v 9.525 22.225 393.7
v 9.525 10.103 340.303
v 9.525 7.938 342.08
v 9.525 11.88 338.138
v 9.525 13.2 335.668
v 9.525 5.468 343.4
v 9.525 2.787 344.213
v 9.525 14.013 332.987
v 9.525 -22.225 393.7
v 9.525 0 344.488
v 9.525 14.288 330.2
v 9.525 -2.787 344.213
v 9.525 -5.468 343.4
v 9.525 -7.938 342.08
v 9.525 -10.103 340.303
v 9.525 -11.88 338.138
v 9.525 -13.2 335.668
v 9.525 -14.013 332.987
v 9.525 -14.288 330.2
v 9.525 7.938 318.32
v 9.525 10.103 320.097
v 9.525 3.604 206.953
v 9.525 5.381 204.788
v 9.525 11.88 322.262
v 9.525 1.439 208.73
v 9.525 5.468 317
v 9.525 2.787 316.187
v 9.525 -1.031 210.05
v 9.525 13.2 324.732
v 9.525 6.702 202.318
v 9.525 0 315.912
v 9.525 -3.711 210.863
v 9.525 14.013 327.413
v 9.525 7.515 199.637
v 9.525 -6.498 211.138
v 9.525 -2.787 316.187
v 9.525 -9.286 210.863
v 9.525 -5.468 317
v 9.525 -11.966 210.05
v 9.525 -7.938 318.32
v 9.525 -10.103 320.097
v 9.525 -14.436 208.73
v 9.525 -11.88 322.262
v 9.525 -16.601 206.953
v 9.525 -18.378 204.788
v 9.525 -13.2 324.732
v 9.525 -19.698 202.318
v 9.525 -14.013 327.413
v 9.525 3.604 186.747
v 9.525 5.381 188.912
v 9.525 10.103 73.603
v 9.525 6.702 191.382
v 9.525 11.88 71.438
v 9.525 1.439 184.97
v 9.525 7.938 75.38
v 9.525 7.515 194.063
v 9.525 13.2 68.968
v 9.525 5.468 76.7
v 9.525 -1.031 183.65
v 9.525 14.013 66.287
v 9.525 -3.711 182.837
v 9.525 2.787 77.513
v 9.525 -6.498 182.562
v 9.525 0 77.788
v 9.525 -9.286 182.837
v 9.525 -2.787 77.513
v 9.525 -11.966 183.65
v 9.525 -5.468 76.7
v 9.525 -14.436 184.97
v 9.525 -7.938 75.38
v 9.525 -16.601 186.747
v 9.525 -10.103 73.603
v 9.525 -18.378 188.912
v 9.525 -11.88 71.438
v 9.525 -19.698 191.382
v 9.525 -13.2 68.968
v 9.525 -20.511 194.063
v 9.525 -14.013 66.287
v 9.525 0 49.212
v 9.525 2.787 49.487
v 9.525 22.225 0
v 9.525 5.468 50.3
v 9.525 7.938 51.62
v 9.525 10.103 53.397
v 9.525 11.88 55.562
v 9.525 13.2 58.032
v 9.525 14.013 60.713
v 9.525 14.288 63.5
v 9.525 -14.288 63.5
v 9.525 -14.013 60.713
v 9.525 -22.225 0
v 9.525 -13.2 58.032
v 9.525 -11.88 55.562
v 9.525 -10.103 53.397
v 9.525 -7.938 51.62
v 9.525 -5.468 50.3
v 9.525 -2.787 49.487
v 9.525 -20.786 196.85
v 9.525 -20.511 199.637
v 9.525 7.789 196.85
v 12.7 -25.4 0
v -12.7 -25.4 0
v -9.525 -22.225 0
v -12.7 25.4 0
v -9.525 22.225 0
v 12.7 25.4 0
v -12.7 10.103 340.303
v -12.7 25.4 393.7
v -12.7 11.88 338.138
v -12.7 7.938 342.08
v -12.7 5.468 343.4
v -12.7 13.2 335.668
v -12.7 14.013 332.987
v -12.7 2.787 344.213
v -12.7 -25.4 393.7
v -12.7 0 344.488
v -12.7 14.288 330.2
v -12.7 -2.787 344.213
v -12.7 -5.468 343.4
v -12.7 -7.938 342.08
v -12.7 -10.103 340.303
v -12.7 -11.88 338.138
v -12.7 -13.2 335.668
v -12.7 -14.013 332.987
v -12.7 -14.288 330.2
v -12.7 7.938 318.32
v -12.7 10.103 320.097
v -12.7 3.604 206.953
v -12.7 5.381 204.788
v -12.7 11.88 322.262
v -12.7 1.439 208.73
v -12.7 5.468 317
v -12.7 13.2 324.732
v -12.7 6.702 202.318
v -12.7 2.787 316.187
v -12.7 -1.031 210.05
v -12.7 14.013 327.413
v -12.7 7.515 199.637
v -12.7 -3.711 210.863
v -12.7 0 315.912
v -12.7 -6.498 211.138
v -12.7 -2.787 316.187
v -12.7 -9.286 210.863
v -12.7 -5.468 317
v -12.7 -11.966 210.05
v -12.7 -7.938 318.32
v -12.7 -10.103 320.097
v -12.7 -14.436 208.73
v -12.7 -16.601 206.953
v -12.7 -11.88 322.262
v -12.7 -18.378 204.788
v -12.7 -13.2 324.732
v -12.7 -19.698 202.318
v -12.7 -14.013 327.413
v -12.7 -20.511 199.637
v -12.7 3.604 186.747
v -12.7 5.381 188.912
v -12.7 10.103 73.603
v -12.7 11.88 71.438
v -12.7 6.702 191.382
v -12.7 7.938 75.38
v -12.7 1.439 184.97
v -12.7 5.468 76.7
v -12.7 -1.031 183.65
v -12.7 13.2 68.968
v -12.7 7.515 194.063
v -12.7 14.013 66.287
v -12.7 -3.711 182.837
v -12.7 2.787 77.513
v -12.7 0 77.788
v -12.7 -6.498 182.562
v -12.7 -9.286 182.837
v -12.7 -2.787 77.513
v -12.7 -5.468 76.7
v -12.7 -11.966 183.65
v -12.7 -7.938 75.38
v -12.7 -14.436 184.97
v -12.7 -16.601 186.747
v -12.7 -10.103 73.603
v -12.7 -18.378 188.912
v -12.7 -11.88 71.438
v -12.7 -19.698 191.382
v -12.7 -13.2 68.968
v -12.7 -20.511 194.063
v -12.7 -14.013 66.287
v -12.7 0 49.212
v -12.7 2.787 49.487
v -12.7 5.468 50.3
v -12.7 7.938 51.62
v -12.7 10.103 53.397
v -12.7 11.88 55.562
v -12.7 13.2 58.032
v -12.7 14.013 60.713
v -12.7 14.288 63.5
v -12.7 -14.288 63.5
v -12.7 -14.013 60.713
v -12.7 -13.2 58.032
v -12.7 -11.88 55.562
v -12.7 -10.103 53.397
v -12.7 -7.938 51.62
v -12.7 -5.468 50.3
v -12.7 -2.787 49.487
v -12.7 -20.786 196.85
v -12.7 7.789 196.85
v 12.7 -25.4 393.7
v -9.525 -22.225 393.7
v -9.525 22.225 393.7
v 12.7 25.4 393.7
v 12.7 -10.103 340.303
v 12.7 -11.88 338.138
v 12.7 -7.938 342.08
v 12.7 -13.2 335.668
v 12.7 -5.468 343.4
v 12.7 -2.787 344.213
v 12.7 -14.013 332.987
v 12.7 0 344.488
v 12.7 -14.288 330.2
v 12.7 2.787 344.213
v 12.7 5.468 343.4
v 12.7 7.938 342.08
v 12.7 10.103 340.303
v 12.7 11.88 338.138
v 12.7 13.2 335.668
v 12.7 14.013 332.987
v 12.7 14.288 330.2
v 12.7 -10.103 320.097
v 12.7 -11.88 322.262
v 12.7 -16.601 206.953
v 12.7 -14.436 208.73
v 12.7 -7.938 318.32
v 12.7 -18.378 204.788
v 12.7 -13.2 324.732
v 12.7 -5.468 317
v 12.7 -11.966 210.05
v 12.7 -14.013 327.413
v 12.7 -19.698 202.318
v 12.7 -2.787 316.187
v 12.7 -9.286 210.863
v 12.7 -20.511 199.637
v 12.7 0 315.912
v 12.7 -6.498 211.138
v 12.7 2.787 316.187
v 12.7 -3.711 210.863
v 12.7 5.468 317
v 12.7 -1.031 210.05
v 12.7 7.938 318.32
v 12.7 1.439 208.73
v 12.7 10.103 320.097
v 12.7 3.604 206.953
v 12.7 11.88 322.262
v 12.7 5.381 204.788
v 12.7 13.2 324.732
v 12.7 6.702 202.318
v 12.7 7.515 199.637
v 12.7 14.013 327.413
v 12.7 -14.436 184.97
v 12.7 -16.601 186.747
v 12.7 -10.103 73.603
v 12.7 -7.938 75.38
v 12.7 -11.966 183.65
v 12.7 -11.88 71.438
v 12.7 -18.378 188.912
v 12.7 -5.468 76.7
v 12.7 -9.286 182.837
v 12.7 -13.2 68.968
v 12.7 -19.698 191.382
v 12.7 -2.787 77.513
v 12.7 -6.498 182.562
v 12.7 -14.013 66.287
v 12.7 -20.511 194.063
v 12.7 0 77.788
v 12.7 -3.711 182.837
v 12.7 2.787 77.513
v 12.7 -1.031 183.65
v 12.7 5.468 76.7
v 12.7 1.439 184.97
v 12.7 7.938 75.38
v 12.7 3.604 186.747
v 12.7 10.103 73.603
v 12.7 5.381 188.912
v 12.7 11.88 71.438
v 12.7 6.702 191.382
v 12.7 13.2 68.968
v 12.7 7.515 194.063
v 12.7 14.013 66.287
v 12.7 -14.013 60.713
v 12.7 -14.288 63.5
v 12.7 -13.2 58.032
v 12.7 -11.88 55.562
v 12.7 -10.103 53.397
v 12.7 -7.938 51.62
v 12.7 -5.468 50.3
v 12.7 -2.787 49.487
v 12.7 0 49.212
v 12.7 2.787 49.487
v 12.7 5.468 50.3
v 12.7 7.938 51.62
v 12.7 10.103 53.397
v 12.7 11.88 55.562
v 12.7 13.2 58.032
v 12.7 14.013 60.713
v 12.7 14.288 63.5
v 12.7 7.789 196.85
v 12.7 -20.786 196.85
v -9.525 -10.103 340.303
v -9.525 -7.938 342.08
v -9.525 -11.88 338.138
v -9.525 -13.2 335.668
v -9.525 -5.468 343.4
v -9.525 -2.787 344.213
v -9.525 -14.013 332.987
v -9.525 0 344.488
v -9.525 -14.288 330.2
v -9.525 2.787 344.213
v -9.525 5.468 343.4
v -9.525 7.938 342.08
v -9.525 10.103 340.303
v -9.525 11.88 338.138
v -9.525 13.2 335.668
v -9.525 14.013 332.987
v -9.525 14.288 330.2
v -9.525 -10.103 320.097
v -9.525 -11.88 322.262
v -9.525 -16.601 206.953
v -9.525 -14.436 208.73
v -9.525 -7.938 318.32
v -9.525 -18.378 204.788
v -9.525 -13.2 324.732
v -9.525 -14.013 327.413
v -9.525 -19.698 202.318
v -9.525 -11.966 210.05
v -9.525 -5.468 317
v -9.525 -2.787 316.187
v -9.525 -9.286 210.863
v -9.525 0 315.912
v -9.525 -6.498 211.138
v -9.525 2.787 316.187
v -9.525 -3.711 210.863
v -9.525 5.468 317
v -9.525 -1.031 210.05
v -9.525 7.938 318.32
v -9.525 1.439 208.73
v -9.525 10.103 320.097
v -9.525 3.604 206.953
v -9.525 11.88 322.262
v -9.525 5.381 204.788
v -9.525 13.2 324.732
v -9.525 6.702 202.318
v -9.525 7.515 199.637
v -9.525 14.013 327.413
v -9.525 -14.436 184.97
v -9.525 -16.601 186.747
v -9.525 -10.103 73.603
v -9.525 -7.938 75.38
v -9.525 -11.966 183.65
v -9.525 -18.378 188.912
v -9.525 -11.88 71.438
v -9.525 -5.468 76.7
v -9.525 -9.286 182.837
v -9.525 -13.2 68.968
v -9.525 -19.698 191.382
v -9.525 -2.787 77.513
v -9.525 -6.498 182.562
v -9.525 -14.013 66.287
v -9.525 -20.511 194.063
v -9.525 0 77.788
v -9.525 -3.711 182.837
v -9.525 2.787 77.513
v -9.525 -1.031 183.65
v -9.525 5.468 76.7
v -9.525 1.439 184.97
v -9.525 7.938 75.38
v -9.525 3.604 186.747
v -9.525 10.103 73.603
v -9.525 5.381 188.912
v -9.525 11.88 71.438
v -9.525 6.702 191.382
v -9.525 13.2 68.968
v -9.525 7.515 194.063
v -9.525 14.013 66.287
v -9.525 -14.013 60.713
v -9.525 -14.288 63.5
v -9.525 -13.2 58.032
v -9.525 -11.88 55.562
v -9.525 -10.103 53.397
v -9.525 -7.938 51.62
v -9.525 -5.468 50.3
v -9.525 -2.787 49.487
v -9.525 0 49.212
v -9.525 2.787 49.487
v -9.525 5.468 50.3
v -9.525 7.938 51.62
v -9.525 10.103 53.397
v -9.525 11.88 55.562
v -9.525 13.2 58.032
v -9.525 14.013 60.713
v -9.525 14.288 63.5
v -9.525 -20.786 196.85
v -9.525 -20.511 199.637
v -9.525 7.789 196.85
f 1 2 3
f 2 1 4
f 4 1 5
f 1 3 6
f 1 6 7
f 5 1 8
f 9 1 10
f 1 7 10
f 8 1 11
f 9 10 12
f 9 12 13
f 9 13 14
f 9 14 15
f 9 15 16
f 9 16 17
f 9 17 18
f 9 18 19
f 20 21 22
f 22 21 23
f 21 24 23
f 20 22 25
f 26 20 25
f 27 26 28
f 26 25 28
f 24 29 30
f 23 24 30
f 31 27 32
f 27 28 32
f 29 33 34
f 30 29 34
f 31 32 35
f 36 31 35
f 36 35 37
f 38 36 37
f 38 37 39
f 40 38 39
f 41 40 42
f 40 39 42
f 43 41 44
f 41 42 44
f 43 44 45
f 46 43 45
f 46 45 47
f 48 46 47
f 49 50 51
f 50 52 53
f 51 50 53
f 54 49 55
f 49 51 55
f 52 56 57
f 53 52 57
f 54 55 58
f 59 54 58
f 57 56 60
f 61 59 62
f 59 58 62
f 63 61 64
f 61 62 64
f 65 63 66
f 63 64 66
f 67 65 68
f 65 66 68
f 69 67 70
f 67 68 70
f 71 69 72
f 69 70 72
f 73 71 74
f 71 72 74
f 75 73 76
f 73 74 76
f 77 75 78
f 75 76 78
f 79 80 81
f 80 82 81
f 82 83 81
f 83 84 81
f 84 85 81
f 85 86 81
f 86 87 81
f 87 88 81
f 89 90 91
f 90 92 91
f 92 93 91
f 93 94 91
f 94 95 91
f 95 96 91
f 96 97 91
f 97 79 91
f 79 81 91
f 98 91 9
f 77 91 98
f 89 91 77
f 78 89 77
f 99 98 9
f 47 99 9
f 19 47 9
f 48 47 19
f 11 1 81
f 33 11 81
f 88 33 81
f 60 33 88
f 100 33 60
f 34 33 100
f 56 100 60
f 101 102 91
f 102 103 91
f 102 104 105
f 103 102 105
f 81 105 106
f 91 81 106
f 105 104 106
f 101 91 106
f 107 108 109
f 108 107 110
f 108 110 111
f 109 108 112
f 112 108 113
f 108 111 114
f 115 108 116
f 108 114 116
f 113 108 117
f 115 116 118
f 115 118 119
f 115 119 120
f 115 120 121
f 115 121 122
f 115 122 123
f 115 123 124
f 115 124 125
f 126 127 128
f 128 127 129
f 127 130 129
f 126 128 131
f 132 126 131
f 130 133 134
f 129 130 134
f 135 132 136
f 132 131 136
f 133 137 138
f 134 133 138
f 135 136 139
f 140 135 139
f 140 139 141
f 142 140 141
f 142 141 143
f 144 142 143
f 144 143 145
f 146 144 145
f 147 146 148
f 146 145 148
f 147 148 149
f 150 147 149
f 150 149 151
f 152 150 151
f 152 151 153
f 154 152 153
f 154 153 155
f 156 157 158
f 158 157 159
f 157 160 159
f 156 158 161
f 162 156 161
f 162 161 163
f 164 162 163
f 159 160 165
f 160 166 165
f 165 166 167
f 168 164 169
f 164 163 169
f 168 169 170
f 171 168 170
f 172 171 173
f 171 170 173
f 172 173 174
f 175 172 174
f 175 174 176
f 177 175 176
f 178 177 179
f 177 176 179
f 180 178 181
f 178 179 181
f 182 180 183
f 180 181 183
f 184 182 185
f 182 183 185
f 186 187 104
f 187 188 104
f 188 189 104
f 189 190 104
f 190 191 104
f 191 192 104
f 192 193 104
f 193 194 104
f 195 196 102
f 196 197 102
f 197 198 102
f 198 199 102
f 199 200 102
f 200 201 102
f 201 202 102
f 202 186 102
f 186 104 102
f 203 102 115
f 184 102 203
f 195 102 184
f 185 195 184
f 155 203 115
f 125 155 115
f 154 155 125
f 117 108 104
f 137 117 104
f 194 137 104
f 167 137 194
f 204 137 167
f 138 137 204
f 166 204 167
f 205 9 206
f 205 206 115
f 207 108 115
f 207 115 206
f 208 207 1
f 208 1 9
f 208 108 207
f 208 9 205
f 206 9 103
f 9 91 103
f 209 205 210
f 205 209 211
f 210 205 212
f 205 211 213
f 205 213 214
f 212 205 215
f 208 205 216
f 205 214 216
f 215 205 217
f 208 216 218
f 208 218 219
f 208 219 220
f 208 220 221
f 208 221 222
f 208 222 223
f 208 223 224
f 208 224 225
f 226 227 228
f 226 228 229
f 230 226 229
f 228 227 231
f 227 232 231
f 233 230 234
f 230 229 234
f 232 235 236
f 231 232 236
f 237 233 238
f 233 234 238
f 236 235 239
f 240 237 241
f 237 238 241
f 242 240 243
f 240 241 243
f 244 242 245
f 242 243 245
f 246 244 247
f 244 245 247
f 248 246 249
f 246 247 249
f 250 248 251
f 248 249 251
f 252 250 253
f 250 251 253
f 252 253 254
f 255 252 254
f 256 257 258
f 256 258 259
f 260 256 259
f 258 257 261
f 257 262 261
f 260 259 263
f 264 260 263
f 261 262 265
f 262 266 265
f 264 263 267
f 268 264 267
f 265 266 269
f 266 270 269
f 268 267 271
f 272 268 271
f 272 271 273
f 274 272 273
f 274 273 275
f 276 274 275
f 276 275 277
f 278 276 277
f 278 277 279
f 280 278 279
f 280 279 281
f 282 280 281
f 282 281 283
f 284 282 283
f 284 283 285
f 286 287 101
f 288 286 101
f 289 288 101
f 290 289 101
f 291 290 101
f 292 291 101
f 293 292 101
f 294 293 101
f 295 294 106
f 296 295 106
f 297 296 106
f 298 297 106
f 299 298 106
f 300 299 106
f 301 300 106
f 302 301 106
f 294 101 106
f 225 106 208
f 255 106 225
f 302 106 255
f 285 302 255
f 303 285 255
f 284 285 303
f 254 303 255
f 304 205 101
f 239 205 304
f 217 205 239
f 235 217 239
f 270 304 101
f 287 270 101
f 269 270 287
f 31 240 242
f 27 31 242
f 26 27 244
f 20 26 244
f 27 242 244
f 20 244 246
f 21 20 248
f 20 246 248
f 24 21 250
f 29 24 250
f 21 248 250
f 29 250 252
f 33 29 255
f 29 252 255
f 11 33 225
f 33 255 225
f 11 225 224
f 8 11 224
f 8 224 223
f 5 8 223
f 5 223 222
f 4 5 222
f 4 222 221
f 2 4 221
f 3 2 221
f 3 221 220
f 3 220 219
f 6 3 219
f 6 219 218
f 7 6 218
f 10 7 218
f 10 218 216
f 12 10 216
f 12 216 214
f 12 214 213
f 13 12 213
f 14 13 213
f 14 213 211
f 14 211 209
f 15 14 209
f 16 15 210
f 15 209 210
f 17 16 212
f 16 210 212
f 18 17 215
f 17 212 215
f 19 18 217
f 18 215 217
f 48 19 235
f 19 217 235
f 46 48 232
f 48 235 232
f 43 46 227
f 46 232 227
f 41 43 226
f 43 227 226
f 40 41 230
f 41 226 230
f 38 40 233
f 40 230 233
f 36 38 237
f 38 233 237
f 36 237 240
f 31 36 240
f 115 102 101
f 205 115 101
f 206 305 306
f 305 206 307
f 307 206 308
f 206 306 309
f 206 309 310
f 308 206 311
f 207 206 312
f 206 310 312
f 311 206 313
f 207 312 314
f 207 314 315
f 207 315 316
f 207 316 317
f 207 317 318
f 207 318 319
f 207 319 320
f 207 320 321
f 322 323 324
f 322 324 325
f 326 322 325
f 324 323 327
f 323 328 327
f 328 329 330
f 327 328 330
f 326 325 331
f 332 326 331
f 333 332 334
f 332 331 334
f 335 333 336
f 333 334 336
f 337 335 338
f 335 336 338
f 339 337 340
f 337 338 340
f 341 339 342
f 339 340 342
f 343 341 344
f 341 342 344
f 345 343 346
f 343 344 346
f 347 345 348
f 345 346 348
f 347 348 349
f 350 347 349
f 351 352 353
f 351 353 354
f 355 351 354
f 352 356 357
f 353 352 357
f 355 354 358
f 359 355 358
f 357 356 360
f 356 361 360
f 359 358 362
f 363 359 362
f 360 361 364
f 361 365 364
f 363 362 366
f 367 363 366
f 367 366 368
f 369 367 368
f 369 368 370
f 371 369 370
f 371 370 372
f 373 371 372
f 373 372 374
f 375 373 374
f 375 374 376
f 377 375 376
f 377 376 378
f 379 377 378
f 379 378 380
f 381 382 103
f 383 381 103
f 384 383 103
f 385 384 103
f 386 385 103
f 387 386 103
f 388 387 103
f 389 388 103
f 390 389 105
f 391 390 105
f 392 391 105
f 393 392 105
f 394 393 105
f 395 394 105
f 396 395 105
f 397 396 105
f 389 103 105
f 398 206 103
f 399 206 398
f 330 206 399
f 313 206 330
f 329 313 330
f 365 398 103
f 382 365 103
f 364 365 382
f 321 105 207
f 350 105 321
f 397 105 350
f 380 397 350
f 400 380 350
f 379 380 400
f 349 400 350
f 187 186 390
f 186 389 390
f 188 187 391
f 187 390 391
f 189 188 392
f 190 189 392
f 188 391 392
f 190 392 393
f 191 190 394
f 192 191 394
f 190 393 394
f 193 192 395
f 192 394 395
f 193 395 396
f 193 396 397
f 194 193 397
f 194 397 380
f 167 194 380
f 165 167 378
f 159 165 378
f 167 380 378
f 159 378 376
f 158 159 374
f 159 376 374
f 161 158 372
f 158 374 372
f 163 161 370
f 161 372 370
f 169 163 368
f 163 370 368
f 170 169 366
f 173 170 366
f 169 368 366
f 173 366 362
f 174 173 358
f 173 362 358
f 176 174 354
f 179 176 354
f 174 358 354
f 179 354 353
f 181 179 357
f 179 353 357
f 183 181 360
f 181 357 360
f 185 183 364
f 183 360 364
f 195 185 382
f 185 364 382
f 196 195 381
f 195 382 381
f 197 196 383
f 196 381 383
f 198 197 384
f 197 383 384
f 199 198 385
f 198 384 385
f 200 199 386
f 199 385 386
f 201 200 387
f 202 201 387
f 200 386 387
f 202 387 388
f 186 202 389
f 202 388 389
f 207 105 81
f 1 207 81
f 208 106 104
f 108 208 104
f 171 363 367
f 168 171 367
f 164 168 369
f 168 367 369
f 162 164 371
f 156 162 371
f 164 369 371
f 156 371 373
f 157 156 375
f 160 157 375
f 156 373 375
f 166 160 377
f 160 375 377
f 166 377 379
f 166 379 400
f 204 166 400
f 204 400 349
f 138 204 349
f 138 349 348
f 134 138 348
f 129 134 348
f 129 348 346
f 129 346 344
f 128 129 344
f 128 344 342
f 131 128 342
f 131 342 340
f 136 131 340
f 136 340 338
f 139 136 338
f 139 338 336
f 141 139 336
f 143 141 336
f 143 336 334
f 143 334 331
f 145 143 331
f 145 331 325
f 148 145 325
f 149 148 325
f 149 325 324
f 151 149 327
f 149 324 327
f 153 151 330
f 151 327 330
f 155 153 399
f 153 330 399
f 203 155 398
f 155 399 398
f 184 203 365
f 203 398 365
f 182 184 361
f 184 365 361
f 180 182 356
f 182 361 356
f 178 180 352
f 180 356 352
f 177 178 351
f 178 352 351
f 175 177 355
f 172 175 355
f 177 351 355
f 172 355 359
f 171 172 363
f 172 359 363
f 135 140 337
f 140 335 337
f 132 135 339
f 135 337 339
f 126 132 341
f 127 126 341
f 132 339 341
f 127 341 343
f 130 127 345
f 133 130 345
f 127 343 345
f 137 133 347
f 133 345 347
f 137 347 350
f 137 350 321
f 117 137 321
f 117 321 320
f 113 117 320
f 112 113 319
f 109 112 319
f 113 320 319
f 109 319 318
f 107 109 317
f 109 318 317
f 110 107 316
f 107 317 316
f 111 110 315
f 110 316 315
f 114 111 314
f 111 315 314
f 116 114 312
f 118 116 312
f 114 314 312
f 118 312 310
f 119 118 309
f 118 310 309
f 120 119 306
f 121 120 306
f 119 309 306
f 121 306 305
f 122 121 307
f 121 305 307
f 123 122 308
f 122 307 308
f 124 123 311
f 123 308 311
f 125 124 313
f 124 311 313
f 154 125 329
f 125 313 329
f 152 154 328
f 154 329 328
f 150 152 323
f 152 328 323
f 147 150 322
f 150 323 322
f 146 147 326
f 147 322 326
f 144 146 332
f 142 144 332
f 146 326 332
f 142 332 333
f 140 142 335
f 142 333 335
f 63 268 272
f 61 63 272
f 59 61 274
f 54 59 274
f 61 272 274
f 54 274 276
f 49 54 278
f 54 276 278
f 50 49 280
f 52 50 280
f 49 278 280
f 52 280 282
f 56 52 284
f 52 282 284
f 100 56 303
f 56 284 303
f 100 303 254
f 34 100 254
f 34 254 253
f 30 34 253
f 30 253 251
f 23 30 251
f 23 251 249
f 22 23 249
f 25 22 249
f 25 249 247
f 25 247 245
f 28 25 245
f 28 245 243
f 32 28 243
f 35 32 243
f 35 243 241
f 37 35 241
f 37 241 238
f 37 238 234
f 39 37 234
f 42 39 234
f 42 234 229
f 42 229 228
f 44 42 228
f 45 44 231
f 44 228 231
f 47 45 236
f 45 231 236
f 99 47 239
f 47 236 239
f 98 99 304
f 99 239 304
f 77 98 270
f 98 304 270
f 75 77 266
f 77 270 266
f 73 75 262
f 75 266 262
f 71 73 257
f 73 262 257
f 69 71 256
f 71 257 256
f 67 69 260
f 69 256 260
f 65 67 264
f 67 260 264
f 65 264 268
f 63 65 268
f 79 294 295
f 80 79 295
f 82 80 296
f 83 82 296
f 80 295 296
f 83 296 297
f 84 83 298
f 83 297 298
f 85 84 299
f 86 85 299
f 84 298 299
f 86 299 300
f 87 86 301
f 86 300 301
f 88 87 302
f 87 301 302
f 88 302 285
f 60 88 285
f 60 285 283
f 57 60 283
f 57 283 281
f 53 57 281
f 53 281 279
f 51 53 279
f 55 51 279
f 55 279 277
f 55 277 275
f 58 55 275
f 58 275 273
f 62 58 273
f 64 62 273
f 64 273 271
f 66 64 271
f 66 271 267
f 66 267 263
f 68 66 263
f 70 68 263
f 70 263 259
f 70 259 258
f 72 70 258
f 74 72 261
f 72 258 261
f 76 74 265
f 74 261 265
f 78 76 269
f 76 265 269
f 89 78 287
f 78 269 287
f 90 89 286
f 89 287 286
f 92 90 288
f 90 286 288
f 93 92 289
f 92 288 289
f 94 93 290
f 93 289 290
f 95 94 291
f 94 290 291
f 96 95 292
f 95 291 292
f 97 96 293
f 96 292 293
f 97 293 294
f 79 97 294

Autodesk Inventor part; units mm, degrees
ref_plane "YZ Plane" through (0, 0, 0) normal (1, 0, 0) x (0, 1, 0)
ref_plane "XZ Plane" through (0, 0, 0) normal (0, 1, 0) x (-1, 0, 0)
ref_plane "XY Plane" through (0, 0, 0) normal (0, 0, 1) x (1, 0, 0)
sketch "Sketch1" plane through (0, 0, 0) normal (0, 0, 1) x (1, 0, 0)
  line L0 (9.525, 22.225) -> (9.525, -22.225)
  line L1 (9.525, -22.225) -> (-9.525, -22.225)
  line L2 (-9.525, -22.225) -> (-9.525, 22.225)
  line L3 (-9.525, 22.225) -> (9.525, 22.225)
  line L4 (12.7, 25.4) -> (-12.7, 25.4)
  line L5 (-12.7, 25.4) -> (-12.7, -25.4)
  line L6 (-12.7, -25.4) -> (12.7, -25.4)
  line L7 (12.7, -25.4) -> (12.7, 25.4)
  point P0 (0, 0)
  point P1 (0, 0)
extrude "Extrusion1" add sketch "Sketch1" along normal blind 393.7
sketch "Sketch2" plane through (12.7, -25.4, 0) normal (1, 0, 0) x (0, 0, -1)
  circle A0 centre (-196.85, 18.9017) radius 14.2875
  line L0 (-393.7, 0) -> (-393.7, 50.8) projected
  line L1 (0, 50.8) -> (0, 0) projected
  point P0 (0, 25.4)
  dimension "d2" = 28.575
  dimension "d22" = 196.85
extrude "Extrusion2" cut sketch "Sketch2" against normal blind 25.4
sketch "Sketch3" plane through (12.7, -25.4, 0) normal (1, 0, 0) x (0, 0, -1)
  circle A0 centre (-196.85, 18.9017) radius 14.2875 projected
  circle A1 centre (-330.2, 25.4) radius 14.2875
  circle A2 centre (-63.5, 25.4) radius 14.2875
  line L0 (-393.7, 0) -> (-393.7, 50.8) projected
  line L1 (0, 0) -> (0, 50.8) projected
  point P0 (0, 25.4)
  dimension "d10" = 28.575
  dimension "d13" = 28.575
  dimension "d17" = 6.4983
  dimension "d20" = 63.5
  dimension "d21" = 63.5
extrude "Extrusion3" cut sketch "Sketch3" against normal blind 25.4 contours A1 | A2
properties part number "side 1"
